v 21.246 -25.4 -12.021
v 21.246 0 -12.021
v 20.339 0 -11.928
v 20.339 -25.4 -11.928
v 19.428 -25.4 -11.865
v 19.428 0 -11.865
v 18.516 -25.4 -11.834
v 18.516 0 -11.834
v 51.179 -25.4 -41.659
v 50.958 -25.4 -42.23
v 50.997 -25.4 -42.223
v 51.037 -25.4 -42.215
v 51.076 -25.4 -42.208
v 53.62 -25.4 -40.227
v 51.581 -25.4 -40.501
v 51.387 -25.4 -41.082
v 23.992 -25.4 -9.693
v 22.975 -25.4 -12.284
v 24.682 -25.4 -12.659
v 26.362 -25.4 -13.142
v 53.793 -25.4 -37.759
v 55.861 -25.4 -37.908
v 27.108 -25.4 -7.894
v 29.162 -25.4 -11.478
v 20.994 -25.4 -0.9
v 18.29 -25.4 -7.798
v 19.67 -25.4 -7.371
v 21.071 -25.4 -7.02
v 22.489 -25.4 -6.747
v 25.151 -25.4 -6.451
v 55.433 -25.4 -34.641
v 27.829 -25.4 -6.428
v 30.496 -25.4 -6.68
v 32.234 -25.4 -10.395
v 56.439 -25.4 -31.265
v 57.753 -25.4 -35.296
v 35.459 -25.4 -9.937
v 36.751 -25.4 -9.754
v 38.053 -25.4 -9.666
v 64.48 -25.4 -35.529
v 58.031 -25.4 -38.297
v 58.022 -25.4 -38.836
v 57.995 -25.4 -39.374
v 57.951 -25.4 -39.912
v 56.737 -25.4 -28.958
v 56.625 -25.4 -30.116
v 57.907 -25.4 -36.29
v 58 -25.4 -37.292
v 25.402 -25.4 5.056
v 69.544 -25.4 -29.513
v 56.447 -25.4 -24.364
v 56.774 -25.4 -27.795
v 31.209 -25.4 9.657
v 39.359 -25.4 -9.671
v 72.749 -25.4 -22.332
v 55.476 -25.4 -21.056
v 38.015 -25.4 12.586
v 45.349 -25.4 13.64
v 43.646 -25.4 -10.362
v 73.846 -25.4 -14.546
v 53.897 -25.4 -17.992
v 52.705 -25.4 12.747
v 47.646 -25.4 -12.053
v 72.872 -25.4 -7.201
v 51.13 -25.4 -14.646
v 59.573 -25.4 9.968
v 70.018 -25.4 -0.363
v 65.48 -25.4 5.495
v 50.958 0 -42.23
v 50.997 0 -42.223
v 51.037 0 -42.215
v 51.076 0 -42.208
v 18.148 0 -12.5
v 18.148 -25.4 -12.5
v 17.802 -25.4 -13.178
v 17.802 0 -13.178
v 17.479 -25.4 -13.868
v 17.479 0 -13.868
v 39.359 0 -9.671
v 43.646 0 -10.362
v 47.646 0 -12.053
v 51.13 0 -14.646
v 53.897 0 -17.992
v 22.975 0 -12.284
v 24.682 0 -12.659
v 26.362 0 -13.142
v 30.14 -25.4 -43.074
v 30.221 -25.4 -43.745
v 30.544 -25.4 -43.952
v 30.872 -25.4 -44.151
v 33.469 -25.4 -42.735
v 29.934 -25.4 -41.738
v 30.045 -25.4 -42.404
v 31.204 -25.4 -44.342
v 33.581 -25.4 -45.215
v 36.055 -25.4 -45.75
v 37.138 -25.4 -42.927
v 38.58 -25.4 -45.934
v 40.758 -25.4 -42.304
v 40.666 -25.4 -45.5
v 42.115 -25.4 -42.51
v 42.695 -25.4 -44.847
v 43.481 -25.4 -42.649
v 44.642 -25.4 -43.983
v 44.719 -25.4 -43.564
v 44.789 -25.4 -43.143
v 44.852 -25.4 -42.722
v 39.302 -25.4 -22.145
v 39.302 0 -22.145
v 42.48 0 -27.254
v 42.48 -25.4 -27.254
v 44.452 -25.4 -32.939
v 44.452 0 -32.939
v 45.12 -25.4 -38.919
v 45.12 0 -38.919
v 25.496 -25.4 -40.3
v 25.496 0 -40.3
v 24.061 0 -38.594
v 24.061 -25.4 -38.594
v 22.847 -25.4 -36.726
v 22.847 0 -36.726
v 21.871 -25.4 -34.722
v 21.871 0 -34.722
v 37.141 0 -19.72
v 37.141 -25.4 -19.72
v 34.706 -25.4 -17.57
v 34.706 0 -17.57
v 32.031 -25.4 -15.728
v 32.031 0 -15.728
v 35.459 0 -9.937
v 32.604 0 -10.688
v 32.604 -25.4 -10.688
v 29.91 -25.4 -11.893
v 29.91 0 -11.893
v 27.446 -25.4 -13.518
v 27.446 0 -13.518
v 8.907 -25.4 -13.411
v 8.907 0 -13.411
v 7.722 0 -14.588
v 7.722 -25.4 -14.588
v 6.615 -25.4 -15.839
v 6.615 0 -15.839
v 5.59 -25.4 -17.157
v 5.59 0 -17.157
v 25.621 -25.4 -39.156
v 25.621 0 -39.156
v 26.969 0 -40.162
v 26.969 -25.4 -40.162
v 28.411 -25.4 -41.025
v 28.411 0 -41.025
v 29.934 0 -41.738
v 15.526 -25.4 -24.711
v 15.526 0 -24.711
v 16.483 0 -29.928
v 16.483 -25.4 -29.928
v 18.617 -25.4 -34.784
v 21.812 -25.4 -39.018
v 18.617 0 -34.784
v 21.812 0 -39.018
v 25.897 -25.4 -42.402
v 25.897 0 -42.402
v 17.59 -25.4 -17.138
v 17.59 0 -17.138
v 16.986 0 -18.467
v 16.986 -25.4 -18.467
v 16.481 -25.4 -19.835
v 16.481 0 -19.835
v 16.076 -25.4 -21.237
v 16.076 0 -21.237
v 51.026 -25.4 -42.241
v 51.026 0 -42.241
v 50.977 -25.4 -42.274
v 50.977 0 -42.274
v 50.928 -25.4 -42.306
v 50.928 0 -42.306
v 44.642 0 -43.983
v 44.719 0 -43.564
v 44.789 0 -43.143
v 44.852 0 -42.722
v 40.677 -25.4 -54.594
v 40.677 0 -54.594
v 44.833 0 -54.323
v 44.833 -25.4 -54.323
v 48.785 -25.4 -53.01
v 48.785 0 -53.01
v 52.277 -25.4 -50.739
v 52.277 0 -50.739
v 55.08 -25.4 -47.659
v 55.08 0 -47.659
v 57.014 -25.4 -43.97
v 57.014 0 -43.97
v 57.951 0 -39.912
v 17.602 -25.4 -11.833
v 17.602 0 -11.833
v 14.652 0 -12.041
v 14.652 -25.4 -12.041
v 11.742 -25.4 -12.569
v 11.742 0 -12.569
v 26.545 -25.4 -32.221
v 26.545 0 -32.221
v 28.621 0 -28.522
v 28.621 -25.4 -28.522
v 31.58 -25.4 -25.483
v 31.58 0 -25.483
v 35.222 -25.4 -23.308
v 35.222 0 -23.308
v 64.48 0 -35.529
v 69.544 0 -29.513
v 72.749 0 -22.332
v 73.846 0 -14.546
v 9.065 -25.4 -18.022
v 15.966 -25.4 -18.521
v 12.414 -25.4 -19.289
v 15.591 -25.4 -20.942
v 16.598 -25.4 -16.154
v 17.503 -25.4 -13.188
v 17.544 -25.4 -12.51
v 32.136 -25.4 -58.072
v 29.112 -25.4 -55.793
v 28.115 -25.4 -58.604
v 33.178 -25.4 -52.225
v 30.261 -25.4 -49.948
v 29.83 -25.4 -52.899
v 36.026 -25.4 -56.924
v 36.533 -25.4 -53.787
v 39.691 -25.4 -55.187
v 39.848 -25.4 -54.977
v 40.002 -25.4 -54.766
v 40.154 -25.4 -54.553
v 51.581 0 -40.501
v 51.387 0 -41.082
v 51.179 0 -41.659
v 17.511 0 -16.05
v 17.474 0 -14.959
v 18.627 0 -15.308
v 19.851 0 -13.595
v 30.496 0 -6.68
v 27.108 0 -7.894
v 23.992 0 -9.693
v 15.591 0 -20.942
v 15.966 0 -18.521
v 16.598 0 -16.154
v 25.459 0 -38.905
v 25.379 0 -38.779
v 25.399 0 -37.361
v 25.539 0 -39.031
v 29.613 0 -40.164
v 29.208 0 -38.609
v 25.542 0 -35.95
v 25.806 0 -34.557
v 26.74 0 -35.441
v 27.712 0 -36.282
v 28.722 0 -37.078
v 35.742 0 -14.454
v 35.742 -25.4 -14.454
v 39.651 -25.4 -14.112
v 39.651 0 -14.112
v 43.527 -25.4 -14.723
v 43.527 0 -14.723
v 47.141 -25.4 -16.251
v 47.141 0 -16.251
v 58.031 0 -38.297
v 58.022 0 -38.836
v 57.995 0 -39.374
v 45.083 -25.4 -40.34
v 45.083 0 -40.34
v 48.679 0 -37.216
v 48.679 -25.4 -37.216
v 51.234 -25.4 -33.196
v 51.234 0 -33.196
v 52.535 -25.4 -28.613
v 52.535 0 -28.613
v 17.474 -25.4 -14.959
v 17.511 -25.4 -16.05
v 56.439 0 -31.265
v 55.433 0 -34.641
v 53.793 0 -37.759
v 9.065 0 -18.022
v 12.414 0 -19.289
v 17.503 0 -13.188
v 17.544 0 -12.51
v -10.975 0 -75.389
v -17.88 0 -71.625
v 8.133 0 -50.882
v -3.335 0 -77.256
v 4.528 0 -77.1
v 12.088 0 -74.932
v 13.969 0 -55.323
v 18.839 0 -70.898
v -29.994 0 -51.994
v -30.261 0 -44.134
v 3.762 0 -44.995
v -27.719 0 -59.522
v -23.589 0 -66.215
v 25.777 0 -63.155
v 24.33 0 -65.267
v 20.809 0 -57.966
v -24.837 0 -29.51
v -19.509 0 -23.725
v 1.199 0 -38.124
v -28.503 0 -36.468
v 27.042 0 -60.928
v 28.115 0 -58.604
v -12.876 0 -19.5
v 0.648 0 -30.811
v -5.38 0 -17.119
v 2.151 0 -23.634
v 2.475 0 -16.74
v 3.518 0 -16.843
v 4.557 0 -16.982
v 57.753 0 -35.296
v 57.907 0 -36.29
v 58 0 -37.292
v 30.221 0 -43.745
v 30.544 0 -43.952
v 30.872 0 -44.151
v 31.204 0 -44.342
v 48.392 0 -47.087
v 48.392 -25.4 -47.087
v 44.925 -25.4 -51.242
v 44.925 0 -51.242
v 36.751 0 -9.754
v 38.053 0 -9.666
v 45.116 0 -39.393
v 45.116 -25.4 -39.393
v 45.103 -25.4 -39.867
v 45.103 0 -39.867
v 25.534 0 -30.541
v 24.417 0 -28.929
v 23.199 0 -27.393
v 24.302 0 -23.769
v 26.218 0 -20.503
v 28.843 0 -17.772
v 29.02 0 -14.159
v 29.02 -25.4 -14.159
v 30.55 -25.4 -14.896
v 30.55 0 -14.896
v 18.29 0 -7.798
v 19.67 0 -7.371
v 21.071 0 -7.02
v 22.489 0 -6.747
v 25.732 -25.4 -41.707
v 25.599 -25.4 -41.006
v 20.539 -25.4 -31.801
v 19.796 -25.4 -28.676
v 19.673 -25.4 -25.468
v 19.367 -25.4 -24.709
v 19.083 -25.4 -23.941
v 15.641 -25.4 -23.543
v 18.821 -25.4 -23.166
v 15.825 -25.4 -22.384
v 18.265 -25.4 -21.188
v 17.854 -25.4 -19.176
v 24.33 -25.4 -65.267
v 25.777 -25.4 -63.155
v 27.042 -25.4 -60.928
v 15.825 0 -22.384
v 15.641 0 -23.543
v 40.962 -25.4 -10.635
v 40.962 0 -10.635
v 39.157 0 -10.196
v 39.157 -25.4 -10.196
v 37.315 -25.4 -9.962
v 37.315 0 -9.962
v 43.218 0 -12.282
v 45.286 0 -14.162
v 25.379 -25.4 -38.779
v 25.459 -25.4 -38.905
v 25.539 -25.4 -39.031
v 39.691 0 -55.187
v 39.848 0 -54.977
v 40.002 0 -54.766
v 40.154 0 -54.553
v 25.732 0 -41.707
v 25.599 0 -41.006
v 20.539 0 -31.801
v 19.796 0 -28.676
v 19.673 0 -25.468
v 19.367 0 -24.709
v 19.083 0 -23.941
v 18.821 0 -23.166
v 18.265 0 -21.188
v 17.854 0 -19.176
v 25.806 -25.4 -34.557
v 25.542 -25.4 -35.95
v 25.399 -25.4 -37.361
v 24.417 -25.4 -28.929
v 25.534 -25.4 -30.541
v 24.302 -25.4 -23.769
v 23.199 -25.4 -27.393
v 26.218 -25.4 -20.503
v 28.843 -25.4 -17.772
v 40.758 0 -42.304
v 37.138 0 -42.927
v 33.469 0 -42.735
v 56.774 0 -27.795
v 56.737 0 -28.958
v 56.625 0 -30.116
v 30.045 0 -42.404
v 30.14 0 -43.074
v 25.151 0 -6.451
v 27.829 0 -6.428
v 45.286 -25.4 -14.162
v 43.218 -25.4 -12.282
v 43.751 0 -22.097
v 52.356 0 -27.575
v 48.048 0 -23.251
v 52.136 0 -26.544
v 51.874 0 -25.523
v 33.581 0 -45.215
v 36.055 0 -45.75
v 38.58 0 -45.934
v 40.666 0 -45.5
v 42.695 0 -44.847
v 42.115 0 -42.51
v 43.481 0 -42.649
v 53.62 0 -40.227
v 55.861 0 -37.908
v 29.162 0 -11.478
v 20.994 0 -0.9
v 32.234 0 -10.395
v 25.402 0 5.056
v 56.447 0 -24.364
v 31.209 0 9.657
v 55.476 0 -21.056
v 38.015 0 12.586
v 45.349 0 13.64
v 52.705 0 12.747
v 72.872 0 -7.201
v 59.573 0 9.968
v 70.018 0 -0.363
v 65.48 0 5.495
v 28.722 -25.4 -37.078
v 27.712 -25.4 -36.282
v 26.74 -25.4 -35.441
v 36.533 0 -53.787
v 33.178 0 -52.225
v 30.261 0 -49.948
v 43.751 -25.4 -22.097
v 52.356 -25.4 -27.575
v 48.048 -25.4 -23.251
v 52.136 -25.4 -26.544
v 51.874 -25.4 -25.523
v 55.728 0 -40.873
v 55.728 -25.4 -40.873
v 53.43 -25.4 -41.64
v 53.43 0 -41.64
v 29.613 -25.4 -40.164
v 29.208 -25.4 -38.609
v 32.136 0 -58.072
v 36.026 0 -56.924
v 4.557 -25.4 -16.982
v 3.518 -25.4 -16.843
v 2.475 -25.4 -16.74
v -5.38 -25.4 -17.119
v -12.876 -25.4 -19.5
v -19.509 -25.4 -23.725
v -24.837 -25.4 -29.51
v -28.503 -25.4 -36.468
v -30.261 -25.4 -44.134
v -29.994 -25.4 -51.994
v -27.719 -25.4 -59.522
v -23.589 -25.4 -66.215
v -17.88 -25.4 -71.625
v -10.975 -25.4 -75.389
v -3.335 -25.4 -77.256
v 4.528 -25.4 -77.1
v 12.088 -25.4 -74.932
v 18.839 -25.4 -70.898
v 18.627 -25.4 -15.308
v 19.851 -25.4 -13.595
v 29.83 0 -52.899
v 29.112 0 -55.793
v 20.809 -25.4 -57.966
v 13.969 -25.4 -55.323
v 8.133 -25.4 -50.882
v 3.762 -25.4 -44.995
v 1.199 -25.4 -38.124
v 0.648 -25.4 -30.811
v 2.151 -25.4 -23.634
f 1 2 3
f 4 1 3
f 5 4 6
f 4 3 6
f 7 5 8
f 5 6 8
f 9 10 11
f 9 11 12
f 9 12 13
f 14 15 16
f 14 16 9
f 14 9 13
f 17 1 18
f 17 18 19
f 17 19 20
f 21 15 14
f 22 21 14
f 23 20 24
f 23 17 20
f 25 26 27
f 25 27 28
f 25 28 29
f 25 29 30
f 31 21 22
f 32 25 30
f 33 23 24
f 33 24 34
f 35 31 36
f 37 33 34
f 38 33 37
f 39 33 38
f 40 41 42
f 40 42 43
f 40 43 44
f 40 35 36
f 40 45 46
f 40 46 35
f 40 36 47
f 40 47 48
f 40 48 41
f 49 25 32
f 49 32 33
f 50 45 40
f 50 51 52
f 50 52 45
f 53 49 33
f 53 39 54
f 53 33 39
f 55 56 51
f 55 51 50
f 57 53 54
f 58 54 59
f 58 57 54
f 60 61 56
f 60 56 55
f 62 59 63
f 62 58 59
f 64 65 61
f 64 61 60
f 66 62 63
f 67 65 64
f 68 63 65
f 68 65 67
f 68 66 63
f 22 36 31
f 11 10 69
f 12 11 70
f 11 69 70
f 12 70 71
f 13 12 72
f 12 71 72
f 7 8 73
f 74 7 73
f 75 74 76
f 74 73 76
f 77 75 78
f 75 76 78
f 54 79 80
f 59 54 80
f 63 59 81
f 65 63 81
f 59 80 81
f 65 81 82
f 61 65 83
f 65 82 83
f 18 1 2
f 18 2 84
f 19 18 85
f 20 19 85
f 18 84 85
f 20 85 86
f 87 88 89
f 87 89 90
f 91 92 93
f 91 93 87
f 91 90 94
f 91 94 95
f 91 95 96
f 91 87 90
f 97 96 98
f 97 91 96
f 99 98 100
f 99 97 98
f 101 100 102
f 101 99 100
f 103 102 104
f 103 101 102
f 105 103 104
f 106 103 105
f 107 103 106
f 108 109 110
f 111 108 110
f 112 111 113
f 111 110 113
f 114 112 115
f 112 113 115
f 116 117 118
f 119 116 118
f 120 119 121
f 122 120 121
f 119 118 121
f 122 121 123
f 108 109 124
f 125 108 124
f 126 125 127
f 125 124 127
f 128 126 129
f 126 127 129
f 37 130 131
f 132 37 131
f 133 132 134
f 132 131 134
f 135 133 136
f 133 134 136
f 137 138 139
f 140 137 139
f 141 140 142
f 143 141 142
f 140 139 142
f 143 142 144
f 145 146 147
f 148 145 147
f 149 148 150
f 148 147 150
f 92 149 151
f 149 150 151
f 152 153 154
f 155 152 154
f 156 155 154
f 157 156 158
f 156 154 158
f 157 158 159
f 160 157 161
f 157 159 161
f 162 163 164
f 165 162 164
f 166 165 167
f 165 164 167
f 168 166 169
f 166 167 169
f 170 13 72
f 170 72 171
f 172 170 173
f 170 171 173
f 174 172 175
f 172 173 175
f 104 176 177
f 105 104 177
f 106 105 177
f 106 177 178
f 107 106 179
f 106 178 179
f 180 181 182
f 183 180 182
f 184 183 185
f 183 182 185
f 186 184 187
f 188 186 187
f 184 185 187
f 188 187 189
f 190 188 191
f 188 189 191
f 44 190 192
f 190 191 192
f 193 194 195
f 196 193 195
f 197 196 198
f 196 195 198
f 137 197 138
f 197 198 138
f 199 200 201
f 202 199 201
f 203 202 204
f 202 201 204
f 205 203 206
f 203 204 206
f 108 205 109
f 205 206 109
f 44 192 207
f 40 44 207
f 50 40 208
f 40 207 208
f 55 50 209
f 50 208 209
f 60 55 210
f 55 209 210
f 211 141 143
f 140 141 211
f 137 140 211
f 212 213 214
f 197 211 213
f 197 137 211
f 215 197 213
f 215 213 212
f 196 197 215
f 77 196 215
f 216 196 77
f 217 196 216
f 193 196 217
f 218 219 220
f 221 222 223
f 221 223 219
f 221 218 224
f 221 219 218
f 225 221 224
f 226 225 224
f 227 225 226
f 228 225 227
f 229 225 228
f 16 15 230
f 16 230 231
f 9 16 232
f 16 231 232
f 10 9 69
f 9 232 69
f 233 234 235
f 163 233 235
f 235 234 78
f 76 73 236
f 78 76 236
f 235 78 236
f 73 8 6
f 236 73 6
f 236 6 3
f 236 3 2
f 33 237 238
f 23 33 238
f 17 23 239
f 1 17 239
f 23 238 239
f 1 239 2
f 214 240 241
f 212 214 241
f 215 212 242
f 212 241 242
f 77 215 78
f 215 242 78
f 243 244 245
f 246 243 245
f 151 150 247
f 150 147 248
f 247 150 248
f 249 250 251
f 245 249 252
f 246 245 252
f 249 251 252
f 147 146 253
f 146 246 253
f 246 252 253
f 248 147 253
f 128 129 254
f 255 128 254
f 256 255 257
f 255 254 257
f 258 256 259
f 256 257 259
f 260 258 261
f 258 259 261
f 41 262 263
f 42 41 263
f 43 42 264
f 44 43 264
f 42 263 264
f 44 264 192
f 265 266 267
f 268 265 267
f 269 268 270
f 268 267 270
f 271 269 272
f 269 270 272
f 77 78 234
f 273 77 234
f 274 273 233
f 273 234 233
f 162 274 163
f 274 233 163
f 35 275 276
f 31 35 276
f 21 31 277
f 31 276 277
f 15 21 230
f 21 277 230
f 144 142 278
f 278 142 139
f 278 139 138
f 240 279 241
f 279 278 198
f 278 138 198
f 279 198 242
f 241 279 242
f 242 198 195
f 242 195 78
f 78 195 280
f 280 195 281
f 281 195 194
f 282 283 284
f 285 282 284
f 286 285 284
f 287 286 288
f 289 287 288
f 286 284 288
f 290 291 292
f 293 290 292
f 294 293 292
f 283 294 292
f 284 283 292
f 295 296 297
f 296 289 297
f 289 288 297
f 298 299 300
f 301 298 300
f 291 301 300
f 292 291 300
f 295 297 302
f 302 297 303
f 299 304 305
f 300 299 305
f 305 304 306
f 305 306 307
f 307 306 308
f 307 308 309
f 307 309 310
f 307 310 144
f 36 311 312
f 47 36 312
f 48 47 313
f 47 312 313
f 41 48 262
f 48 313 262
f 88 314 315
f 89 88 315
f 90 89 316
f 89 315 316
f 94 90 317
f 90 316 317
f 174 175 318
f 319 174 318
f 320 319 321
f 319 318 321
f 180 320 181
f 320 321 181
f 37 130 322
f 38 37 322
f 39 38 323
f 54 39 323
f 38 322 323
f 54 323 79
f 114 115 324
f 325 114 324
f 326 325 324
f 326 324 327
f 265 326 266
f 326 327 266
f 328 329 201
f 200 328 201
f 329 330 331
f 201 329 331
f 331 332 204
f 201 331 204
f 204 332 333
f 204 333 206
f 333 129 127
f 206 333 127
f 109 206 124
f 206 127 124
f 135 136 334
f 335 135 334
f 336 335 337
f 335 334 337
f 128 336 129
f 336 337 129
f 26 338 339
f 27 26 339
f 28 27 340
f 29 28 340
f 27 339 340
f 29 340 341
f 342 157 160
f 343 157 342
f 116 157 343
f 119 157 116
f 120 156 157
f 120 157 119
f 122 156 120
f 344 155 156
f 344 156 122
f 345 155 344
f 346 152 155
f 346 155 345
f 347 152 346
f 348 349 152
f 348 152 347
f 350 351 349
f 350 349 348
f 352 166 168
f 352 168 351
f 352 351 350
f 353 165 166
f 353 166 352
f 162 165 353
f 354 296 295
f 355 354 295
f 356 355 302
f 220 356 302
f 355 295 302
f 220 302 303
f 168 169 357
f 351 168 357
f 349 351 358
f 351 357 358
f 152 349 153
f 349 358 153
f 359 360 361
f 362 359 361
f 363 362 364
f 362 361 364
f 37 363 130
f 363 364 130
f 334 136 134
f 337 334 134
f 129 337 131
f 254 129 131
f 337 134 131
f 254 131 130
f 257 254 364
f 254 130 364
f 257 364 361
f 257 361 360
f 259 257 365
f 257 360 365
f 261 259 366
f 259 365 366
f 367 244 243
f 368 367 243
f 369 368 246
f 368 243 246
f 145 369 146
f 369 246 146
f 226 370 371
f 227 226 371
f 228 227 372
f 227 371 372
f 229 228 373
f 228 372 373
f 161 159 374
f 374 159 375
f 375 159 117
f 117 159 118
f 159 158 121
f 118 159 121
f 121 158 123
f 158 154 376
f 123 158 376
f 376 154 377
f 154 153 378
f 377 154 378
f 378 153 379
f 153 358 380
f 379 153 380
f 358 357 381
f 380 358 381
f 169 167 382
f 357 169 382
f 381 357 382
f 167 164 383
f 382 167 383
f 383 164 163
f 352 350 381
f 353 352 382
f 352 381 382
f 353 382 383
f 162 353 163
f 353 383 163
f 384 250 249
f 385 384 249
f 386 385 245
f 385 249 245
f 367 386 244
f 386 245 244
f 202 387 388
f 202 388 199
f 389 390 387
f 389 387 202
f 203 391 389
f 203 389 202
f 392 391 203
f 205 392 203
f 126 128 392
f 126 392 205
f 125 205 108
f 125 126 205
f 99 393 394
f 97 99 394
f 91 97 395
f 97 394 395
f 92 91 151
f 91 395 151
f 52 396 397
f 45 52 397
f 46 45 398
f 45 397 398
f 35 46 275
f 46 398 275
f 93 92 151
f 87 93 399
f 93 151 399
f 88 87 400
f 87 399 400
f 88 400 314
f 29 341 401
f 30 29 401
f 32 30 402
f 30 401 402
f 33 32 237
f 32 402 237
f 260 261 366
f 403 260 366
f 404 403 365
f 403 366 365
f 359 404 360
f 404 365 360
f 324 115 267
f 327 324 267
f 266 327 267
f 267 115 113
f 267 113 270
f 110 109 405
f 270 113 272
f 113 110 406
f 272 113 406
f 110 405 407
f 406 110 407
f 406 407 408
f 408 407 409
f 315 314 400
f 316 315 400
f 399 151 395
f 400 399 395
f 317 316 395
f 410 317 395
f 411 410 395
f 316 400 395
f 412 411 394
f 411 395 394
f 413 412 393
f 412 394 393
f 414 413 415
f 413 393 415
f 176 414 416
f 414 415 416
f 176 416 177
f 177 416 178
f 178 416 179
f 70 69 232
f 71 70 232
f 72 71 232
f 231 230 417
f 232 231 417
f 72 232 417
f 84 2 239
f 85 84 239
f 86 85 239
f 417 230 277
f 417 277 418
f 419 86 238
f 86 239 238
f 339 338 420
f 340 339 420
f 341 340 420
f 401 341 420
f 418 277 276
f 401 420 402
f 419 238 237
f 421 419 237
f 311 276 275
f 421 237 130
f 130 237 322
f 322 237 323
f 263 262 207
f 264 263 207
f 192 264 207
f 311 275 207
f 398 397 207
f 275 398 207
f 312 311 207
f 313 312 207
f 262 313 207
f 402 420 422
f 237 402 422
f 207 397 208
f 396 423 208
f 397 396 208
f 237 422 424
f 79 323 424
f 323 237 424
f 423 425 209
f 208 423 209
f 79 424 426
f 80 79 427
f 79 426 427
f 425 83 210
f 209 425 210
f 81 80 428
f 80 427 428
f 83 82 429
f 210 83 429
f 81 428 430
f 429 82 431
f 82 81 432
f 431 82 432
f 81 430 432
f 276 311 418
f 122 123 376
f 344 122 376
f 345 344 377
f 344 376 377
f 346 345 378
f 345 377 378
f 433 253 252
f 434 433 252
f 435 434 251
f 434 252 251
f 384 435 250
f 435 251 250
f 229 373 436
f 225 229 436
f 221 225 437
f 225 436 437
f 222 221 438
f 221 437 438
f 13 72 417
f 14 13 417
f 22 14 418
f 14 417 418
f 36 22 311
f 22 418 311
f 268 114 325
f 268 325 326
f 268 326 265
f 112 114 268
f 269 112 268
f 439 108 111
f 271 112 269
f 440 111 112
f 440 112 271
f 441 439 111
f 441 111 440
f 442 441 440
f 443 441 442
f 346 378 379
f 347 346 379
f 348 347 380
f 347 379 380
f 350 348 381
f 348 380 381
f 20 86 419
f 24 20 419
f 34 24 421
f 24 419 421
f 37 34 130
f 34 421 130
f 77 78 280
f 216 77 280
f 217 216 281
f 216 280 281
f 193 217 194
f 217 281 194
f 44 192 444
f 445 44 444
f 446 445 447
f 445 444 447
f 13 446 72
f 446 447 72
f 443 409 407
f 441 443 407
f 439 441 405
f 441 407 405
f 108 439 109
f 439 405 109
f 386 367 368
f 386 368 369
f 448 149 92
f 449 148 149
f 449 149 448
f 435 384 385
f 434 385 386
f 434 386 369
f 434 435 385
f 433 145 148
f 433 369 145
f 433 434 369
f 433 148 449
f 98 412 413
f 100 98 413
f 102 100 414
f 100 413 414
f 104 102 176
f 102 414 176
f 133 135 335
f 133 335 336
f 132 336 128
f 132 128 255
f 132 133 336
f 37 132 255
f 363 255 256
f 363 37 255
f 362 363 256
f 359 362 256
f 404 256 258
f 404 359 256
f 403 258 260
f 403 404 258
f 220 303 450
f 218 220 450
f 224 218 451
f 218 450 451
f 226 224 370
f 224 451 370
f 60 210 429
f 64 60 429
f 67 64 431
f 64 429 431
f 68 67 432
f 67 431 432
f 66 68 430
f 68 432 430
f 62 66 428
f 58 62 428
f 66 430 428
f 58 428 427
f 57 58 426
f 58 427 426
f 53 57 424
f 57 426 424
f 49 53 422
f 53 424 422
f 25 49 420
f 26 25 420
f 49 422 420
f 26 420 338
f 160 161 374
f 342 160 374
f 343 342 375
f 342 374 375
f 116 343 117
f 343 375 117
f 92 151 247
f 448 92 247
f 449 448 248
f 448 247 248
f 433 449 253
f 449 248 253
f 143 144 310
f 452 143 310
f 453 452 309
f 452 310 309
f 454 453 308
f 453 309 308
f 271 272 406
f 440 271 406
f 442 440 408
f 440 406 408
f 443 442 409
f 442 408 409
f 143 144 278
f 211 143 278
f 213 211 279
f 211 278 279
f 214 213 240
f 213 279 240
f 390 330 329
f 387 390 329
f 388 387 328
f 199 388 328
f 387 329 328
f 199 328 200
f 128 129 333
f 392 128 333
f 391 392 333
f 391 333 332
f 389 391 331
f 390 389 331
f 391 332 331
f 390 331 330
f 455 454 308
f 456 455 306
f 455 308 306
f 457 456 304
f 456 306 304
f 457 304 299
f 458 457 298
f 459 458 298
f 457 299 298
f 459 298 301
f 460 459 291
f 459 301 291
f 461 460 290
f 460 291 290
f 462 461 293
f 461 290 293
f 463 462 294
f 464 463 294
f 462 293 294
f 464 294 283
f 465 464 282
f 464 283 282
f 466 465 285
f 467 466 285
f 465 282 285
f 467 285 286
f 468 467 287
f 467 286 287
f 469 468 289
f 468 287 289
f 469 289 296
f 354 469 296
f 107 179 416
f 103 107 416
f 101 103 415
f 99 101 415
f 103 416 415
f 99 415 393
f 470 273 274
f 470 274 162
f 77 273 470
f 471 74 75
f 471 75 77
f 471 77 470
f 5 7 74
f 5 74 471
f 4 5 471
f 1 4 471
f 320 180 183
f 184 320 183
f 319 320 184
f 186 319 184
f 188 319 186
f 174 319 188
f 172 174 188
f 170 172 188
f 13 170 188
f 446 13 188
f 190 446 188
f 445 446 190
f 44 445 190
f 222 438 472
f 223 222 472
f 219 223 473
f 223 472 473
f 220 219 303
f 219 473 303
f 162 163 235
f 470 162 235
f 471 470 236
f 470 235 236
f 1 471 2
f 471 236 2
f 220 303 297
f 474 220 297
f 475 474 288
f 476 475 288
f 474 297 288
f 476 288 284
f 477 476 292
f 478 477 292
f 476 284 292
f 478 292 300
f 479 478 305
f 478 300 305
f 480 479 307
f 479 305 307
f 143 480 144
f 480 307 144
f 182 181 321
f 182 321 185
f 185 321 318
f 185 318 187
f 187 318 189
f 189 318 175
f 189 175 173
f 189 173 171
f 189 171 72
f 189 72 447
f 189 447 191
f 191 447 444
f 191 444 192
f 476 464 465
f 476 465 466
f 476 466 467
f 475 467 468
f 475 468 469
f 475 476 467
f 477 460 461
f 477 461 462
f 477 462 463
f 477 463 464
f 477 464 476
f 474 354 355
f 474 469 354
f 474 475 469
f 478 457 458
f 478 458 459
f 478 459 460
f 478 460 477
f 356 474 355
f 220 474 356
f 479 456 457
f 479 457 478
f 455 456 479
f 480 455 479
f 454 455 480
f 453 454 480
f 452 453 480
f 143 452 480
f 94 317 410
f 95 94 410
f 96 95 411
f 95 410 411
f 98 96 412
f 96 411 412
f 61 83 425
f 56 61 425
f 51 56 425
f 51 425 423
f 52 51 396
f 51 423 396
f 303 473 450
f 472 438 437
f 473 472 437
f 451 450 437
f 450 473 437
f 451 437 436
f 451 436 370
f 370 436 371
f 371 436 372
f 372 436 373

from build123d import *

# Parameters (mm, degrees)
F1_DEPTH = 25.4


with BuildPart() as f1:
    # F0 (on Front) → F1 (new body)
    with BuildSketch(Plane.XZ):
        with BuildLine():
            ThreePointArc((40.1538575824, -54.5525371766), (34.8112838881, -53.101159825), (30.2607130008, -49.9480828366))
            ThreePointArc((30.2607130008, -49.9480828366), (29.5067805021, -54.3549736685), (28.1146409687, -58.6036262239))
            ThreePointArc((28.1146409687, -58.6036262239), (34.1030907269, -57.5733618162), (39.691420026, -55.1872455363))
            ThreePointArc((39.691420026, -55.1872455363), (39.9249388458, -54.8715671271), (40.1538575824, -54.5525371766))
        make_face()
    extrude(amount=F1_DEPTH)


with BuildPart() as f1b:
    # F0 (on Front) → F1, piece 2 (new body)
    with BuildSketch(Plane.XZ):
        with BuildLine():
            ThreePointArc((24.3295831314, -65.2665911695), (26.4328949575, -62.0548490079), (28.1146409687, -58.6036262239))
            ThreePointArc((28.1146409687, -58.6036262239), (3.7618317001, -44.9945627843), (5.5896871945, -17.1570903547))
            ThreePointArc((5.5896871945, -17.1570903547), (4.0379815695, -16.9081548594), (2.4754848513, -16.7397409859))
            ThreePointArc((2.4754848513, -16.7397409859), (-6.670828805, -50.0432179604), (24.3295831314, -65.2665911695))
        make_face()
        with BuildLine():
            ThreePointArc((2.4754848513, -16.7397409859), (-27.7189775168, -59.5222653089), (24.3295831314, -65.2665911695))
            ThreePointArc((24.3295831314, -65.2665911695), (-6.670828805, -50.0432179604), (2.4754848513, -16.7397409859))
        make_face()
    extrude(amount=F1_DEPTH)


with BuildPart() as f1c:
    # F0 (on Front) → F1, piece 3 (new body)
    with BuildSketch(Plane.XZ):
        with BuildLine():
            ThreePointArc((15.5259313509, -24.7108479388), (18.6165177504, -34.7842088044), (25.8966178224, -42.4015880363))
            ThreePointArc((25.8966178224, -42.4015880363), (25.6616341127, -41.3572292778), (25.4955819125, -40.2997184139))
            ThreePointArc((25.4955819125, -40.2997184139), (23.4256571039, -37.6786317178), (21.8713846988, -34.7224650322))
            ThreePointArc((21.8713846988, -34.7224650322), (20.0913666116, -30.2566972991), (19.6726895469, -25.4675162258))
            ThreePointArc((19.6726895469, -25.4675162258), (19.221825797, -24.3258278708), (18.8210952423, -23.1655927897))
            ThreePointArc((18.8210952423, -23.1655927897), (17.4751466685, -22.1634611108), (16.075953424, -21.2371222257))
            ThreePointArc((16.075953424, -21.2371222257), (15.7246867633, -22.9619109348), (15.5259313509, -24.7108479388))
        make_face()
        with BuildLine():
            ThreePointArc((17.5902280452, -17.1382927375), (16.7211824063, -19.1463639854), (16.075953424, -21.2371222257))
            ThreePointArc((16.075953424, -21.2371222257), (17.4751466685, -22.1634611108), (18.8210952423, -23.1655927897))
            ThreePointArc((18.8210952423, -23.1655927897), (18.0407428379, -20.1856217155), (17.5902280452, -17.1382927375))
        make_face()
    extrude(amount=F1_DEPTH)


with BuildPart() as f1d:
    # F0 (on Front) → F1, piece 4 (new body)
    with BuildSketch(Plane.XZ):
        with BuildLine():
            ThreePointArc((8.9074729487, -13.4113681026), (7.1586729424, -15.2045936945), (5.5896871945, -17.1570903547))
            ThreePointArc((5.5896871945, -17.1570903547), (10.7582958294, -18.606057575), (15.5914806817, -20.94151158))
            ThreePointArc((15.5914806817, -20.94151158), (16.2501882549, -17.3285688299), (17.4789014653, -13.8677141914))
            ThreePointArc((17.4789014653, -13.8677141914), (17.5218559184, -12.8490388813), (17.6016231545, -11.8325834418))
            ThreePointArc((17.6016231545, -11.8325834418), (13.1897424114, -12.265100016), (8.9074729487, -13.4113681026))
        make_face()
    extrude(amount=F1_DEPTH)


with BuildPart() as f1e:
    # F0 (on Front) → F1, piece 5 (new body)
    with BuildSketch(Plane.XZ):
        with BuildLine():
            ThreePointArc((50.9276188863, -42.3062252748), (46.7662943353, -49.2544379076), (40.6765473403, -54.5938444613))
            ThreePointArc((40.6765473403, -54.5938444613), (52.276756188, -50.7389787125), (57.9506689588, -39.9116268146))
            ThreePointArc((57.9506689588, -39.9116268146), (54.5873270883, -41.2815480667), (51.0757678908, -42.2076715883))
            ThreePointArc((51.0757678908, -42.2076715883), (51.0017892703, -42.257092564), (50.9276188863, -42.3062252748))
        make_face()
    extrude(amount=F1_DEPTH)


with BuildPart() as f1f:
    # F0 (on Front) → F1, piece 6 (new body)
    with BuildSketch(Plane.XZ):
        with BuildLine():
            ThreePointArc((29.9343874447, -41.7375034561), (30.0945281638, -42.7386739982), (30.2211937836, -43.744627936))
            ThreePointArc((30.2211937836, -43.744627936), (30.7074945796, -44.0520833186), (31.204438934, -44.3420205277))
            ThreePointArc((31.204438934, -44.3420205277), (34.8084393601, -45.5256885647), (38.5798125698, -45.9338958727))
            ThreePointArc((38.5798125698, -45.9338958727), (41.6890159042, -45.2005751575), (44.6424357179, -43.9831122014))
            ThreePointArc((44.6424357179, -43.9831122014), (44.7545364965, -43.3536151903), (44.8517491914, -42.721647815))
            ThreePointArc((44.8517491914, -42.721647815), (42.7970382383, -42.5875979854), (40.7575952062, -42.3039105235))
            ThreePointArc((40.7575952062, -42.3039105235), (35.2982122915, -42.9336942044), (29.9343874447, -41.7375034561))
        make_face()
    extrude(amount=F1_DEPTH)


with BuildPart() as f1g:
    # F0 (on Front) → F1, piece 7 (new body)
    with BuildSketch(Plane.XZ):
        with BuildLine():
            ThreePointArc((58.0307088051, -38.2968299091), (58.0106865683, -39.1052195774), (57.9506689588, -39.9116268146))
            ThreePointArc((57.9506689588, -39.9116268146), (69.5436503466, -29.5130224408), (73.8457056162, -14.5457076903))
            ThreePointArc((73.8457056162, -14.5457076903), (49.056653384, 13.4361560453), (18.2902101299, -7.7984331473))
            ThreePointArc((18.2902101299, -7.7984331473), (20.3676668553, -7.1857892567), (22.4887407194, -6.747377754))
            ThreePointArc((22.4887407194, -6.747377754), (47.2916450309, -2.1862580033), (61.2010402451, -23.2223365456))
            ThreePointArc((61.2010402451, -23.2223365456), (60.3220490691, -29.5007146335), (57.7526664727, -35.2963103729))
            ThreePointArc((57.7526664727, -35.2963103729), (57.9610496417, -36.7901427298), (58.0307088051, -38.2968299091))
        make_face()
        with BuildLine():
            ThreePointArc((51.5809438877, -40.5006277219), (51.2847425976, -41.3710254533), (50.9580903246, -42.2304588174))
            ThreePointArc((50.9580903246, -42.2304588174), (51.0169412202, -42.219127754), (51.0757678908, -42.2076715883))
            ThreePointArc((51.0757678908, -42.2076715883), (54.7814604512, -39.1067758035), (57.7526664727, -35.2963103729))
            ThreePointArc((57.7526664727, -35.2963103729), (57.2273138462, -33.2379593231), (56.4391944195, -31.2652271578))
            ThreePointArc((56.4391944195, -31.2652271578), (54.6885472182, -36.2398384797), (51.5809438877, -40.5006277219))
        make_face()
        with BuildLine():
            ThreePointArc((30.4962956225, -6.6797554599), (25.5094366348, -8.7234981349), (21.2464283719, -12.020831487))
            ThreePointArc((21.2464283719, -12.020831487), (23.8314740731, -12.4577169776), (26.3621830346, -13.1424376226))
            ThreePointArc((26.3621830346, -13.1424376226), (30.6712198814, -10.8607569892), (35.458676282, -9.9365674679))
            ThreePointArc((35.458676282, -9.9365674679), (37.4014358799, -9.6982527409), (39.3585631952, -9.6706586179))
            ThreePointArc((39.3585631952, -9.6706586179), (35.0624037675, -7.7752680174), (30.4962956225, -6.6797554599))
        make_face()
        with BuildLine():
            ThreePointArc((61.2010402451, -23.2223365456), (47.2916450309, -2.1862580033), (22.4887407194, -6.747377754))
            ThreePointArc((22.4887407194, -6.747377754), (26.4899111925, -6.4048589093), (30.4962956225, -6.6797554599))
            ThreePointArc((30.4962956225, -6.6797554599), (44.2759524191, -8.0348709228), (53.8971199923, -17.9922005789))
            ThreePointArc((53.8971199923, -17.9922005789), (56.0400887398, -22.6869112297), (56.7742198891, -27.7951080352))
            ThreePointArc((56.7742198891, -27.7951080352), (56.6902692508, -29.538235167), (56.4391944195, -31.2652271578))
            ThreePointArc((56.4391944195, -31.2652271578), (57.2273138462, -33.2379593231), (57.7526664727, -35.2963103729))
            ThreePointArc((57.7526664727, -35.2963103729), (60.3220490691, -29.5007146335), (61.2010402451, -23.2223365456))
        make_face()
        with BuildLine():
            ThreePointArc((53.8971199923, -17.9922005789), (44.2759524191, -8.0348709228), (30.4962956225, -6.6797554599))
            ThreePointArc((30.4962956225, -6.6797554599), (35.0624037675, -7.7752680174), (39.3585631952, -9.6706586179))
            ThreePointArc((39.3585631952, -9.6706586179), (47.6460065242, -12.0525947694), (53.8971199923, -17.9922005789))
        make_face()
    extrude(amount=F1_DEPTH)


with BuildPart() as f1h:
    # F0 (on Front) → F1, piece 8 (new body)
    with BuildSketch(Plane.XZ):
        with BuildLine():
            ThreePointArc((25.6211827252, -39.1560673783), (27.6790096014, -40.6118249025), (29.9343874447, -41.7375034561))
            ThreePointArc((29.9343874447, -41.7375034561), (29.4205430771, -39.3836074861), (28.7219041832, -37.0777961393))
            ThreePointArc((28.7219041832, -37.0777961393), (27.2210036067, -35.8671250202), (25.8063894155, -34.5566694548))
            ThreePointArc((25.8063894155, -34.5566694548), (25.4551400683, -36.6539261554), (25.3794041172, -38.7790439964))
            ThreePointArc((25.3794041172, -38.7790439964), (25.4989862537, -38.9683939513), (25.6211827252, -39.1560673783))
        make_face()
    extrude(amount=F1_DEPTH)


with BuildPart() as f1i:
    # F0 (on Front) → F1, piece 9 (new body)
    with BuildSketch(Plane.XZ):
        with BuildLine():
            ThreePointArc((18.5160606443, -11.8335602694), (17.9720702659, -12.8376809675), (17.4789014653, -13.8677141914))
            ThreePointArc((17.4789014653, -13.8677141914), (17.4870617924, -15.5046204085), (17.5902280452, -17.1382927375))
            ThreePointArc((17.5902280452, -17.1382927375), (19.2165746577, -14.4354180997), (21.2464283719, -12.020831487))
            ThreePointArc((21.2464283719, -12.020831487), (19.8836109137, -11.8926942742), (18.5160606443, -11.8335602694))
        make_face()
    extrude(amount=F1_DEPTH)


with BuildPart() as f1j:
    # F0 (on Front) → F1, piece 10 (new body)
    with BuildSketch(Plane.XZ):
        with BuildLine():
            ThreePointArc((23.1989496039, -27.3925757669), (24.988667911, -29.7260062824), (26.5445537779, -32.221443871))
            ThreePointArc((26.5445537779, -32.221443871), (31.5800674362, -25.4827792883), (39.3017660933, -22.1449105057))
            ThreePointArc((39.3017660933, -22.1449105057), (35.9559801688, -18.608500995), (32.0312678982, -15.7280306735))
            ThreePointArc((32.0312678982, -15.7280306735), (26.218280873, -20.5026341621), (23.1989496039, -27.3925757669))
        make_face()
    extrude(amount=F1_DEPTH)


with BuildPart() as f1k:
    # F0 (on Front) → F1, piece 11 (new body)
    with BuildSketch(Plane.XZ):
        with BuildLine():
            ThreePointArc((45.1199353433, -38.9192253351), (45.1106157855, -39.6297514098), (45.0826635243, -40.3397886117))
            ThreePointArc((45.0826635243, -40.3397886117), (50.1017921487, -35.2983013137), (52.5349959324, -28.6134104641))
            ThreePointArc((52.5349959324, -28.6134104641), (52.2512002854, -27.0582791448), (51.8738445479, -25.5231648048))
            ThreePointArc((51.8738445479, -25.5231648048), (45.9390130106, -22.5270281049), (39.3017660933, -22.1449105057))
            ThreePointArc((39.3017660933, -22.1449105057), (43.6240948292, -30.0418843563), (45.1199353433, -38.9192253351))
        make_face()
    extrude(amount=F1_DEPTH)


with BuildPart() as f1l:
    # F0 (on Front) → F1, piece 12 (new body)
    with BuildSketch(Plane.XZ):
        with BuildLine():
            ThreePointArc((35.458676282, -9.9365674679), (31.2325863434, -11.2355838156), (27.4463006765, -13.5184154981))
            ThreePointArc((27.4463006765, -13.5184154981), (29.7907916271, -14.5153074856), (32.0312678982, -15.7280306735))
            ThreePointArc((32.0312678982, -15.7280306735), (39.651377077, -14.1119977804), (47.1414811046, -16.2511489823))
            ThreePointArc((47.1414811046, -16.2511489823), (44.2775224684, -13.1942630568), (40.9617154104, -10.6345298313))
            ThreePointArc((40.9617154104, -10.6345298313), (38.2397055228, -10.0528815127), (35.458676282, -9.9365674679))
        make_face()
    extrude(amount=F1_DEPTH)


solid = Compound([f1.part, f1b.part, f1c.part, f1d.part, f1e.part, f1f.part, f1g.part, f1h.part, f1i.part, f1j.part, f1k.part, f1l.part])
